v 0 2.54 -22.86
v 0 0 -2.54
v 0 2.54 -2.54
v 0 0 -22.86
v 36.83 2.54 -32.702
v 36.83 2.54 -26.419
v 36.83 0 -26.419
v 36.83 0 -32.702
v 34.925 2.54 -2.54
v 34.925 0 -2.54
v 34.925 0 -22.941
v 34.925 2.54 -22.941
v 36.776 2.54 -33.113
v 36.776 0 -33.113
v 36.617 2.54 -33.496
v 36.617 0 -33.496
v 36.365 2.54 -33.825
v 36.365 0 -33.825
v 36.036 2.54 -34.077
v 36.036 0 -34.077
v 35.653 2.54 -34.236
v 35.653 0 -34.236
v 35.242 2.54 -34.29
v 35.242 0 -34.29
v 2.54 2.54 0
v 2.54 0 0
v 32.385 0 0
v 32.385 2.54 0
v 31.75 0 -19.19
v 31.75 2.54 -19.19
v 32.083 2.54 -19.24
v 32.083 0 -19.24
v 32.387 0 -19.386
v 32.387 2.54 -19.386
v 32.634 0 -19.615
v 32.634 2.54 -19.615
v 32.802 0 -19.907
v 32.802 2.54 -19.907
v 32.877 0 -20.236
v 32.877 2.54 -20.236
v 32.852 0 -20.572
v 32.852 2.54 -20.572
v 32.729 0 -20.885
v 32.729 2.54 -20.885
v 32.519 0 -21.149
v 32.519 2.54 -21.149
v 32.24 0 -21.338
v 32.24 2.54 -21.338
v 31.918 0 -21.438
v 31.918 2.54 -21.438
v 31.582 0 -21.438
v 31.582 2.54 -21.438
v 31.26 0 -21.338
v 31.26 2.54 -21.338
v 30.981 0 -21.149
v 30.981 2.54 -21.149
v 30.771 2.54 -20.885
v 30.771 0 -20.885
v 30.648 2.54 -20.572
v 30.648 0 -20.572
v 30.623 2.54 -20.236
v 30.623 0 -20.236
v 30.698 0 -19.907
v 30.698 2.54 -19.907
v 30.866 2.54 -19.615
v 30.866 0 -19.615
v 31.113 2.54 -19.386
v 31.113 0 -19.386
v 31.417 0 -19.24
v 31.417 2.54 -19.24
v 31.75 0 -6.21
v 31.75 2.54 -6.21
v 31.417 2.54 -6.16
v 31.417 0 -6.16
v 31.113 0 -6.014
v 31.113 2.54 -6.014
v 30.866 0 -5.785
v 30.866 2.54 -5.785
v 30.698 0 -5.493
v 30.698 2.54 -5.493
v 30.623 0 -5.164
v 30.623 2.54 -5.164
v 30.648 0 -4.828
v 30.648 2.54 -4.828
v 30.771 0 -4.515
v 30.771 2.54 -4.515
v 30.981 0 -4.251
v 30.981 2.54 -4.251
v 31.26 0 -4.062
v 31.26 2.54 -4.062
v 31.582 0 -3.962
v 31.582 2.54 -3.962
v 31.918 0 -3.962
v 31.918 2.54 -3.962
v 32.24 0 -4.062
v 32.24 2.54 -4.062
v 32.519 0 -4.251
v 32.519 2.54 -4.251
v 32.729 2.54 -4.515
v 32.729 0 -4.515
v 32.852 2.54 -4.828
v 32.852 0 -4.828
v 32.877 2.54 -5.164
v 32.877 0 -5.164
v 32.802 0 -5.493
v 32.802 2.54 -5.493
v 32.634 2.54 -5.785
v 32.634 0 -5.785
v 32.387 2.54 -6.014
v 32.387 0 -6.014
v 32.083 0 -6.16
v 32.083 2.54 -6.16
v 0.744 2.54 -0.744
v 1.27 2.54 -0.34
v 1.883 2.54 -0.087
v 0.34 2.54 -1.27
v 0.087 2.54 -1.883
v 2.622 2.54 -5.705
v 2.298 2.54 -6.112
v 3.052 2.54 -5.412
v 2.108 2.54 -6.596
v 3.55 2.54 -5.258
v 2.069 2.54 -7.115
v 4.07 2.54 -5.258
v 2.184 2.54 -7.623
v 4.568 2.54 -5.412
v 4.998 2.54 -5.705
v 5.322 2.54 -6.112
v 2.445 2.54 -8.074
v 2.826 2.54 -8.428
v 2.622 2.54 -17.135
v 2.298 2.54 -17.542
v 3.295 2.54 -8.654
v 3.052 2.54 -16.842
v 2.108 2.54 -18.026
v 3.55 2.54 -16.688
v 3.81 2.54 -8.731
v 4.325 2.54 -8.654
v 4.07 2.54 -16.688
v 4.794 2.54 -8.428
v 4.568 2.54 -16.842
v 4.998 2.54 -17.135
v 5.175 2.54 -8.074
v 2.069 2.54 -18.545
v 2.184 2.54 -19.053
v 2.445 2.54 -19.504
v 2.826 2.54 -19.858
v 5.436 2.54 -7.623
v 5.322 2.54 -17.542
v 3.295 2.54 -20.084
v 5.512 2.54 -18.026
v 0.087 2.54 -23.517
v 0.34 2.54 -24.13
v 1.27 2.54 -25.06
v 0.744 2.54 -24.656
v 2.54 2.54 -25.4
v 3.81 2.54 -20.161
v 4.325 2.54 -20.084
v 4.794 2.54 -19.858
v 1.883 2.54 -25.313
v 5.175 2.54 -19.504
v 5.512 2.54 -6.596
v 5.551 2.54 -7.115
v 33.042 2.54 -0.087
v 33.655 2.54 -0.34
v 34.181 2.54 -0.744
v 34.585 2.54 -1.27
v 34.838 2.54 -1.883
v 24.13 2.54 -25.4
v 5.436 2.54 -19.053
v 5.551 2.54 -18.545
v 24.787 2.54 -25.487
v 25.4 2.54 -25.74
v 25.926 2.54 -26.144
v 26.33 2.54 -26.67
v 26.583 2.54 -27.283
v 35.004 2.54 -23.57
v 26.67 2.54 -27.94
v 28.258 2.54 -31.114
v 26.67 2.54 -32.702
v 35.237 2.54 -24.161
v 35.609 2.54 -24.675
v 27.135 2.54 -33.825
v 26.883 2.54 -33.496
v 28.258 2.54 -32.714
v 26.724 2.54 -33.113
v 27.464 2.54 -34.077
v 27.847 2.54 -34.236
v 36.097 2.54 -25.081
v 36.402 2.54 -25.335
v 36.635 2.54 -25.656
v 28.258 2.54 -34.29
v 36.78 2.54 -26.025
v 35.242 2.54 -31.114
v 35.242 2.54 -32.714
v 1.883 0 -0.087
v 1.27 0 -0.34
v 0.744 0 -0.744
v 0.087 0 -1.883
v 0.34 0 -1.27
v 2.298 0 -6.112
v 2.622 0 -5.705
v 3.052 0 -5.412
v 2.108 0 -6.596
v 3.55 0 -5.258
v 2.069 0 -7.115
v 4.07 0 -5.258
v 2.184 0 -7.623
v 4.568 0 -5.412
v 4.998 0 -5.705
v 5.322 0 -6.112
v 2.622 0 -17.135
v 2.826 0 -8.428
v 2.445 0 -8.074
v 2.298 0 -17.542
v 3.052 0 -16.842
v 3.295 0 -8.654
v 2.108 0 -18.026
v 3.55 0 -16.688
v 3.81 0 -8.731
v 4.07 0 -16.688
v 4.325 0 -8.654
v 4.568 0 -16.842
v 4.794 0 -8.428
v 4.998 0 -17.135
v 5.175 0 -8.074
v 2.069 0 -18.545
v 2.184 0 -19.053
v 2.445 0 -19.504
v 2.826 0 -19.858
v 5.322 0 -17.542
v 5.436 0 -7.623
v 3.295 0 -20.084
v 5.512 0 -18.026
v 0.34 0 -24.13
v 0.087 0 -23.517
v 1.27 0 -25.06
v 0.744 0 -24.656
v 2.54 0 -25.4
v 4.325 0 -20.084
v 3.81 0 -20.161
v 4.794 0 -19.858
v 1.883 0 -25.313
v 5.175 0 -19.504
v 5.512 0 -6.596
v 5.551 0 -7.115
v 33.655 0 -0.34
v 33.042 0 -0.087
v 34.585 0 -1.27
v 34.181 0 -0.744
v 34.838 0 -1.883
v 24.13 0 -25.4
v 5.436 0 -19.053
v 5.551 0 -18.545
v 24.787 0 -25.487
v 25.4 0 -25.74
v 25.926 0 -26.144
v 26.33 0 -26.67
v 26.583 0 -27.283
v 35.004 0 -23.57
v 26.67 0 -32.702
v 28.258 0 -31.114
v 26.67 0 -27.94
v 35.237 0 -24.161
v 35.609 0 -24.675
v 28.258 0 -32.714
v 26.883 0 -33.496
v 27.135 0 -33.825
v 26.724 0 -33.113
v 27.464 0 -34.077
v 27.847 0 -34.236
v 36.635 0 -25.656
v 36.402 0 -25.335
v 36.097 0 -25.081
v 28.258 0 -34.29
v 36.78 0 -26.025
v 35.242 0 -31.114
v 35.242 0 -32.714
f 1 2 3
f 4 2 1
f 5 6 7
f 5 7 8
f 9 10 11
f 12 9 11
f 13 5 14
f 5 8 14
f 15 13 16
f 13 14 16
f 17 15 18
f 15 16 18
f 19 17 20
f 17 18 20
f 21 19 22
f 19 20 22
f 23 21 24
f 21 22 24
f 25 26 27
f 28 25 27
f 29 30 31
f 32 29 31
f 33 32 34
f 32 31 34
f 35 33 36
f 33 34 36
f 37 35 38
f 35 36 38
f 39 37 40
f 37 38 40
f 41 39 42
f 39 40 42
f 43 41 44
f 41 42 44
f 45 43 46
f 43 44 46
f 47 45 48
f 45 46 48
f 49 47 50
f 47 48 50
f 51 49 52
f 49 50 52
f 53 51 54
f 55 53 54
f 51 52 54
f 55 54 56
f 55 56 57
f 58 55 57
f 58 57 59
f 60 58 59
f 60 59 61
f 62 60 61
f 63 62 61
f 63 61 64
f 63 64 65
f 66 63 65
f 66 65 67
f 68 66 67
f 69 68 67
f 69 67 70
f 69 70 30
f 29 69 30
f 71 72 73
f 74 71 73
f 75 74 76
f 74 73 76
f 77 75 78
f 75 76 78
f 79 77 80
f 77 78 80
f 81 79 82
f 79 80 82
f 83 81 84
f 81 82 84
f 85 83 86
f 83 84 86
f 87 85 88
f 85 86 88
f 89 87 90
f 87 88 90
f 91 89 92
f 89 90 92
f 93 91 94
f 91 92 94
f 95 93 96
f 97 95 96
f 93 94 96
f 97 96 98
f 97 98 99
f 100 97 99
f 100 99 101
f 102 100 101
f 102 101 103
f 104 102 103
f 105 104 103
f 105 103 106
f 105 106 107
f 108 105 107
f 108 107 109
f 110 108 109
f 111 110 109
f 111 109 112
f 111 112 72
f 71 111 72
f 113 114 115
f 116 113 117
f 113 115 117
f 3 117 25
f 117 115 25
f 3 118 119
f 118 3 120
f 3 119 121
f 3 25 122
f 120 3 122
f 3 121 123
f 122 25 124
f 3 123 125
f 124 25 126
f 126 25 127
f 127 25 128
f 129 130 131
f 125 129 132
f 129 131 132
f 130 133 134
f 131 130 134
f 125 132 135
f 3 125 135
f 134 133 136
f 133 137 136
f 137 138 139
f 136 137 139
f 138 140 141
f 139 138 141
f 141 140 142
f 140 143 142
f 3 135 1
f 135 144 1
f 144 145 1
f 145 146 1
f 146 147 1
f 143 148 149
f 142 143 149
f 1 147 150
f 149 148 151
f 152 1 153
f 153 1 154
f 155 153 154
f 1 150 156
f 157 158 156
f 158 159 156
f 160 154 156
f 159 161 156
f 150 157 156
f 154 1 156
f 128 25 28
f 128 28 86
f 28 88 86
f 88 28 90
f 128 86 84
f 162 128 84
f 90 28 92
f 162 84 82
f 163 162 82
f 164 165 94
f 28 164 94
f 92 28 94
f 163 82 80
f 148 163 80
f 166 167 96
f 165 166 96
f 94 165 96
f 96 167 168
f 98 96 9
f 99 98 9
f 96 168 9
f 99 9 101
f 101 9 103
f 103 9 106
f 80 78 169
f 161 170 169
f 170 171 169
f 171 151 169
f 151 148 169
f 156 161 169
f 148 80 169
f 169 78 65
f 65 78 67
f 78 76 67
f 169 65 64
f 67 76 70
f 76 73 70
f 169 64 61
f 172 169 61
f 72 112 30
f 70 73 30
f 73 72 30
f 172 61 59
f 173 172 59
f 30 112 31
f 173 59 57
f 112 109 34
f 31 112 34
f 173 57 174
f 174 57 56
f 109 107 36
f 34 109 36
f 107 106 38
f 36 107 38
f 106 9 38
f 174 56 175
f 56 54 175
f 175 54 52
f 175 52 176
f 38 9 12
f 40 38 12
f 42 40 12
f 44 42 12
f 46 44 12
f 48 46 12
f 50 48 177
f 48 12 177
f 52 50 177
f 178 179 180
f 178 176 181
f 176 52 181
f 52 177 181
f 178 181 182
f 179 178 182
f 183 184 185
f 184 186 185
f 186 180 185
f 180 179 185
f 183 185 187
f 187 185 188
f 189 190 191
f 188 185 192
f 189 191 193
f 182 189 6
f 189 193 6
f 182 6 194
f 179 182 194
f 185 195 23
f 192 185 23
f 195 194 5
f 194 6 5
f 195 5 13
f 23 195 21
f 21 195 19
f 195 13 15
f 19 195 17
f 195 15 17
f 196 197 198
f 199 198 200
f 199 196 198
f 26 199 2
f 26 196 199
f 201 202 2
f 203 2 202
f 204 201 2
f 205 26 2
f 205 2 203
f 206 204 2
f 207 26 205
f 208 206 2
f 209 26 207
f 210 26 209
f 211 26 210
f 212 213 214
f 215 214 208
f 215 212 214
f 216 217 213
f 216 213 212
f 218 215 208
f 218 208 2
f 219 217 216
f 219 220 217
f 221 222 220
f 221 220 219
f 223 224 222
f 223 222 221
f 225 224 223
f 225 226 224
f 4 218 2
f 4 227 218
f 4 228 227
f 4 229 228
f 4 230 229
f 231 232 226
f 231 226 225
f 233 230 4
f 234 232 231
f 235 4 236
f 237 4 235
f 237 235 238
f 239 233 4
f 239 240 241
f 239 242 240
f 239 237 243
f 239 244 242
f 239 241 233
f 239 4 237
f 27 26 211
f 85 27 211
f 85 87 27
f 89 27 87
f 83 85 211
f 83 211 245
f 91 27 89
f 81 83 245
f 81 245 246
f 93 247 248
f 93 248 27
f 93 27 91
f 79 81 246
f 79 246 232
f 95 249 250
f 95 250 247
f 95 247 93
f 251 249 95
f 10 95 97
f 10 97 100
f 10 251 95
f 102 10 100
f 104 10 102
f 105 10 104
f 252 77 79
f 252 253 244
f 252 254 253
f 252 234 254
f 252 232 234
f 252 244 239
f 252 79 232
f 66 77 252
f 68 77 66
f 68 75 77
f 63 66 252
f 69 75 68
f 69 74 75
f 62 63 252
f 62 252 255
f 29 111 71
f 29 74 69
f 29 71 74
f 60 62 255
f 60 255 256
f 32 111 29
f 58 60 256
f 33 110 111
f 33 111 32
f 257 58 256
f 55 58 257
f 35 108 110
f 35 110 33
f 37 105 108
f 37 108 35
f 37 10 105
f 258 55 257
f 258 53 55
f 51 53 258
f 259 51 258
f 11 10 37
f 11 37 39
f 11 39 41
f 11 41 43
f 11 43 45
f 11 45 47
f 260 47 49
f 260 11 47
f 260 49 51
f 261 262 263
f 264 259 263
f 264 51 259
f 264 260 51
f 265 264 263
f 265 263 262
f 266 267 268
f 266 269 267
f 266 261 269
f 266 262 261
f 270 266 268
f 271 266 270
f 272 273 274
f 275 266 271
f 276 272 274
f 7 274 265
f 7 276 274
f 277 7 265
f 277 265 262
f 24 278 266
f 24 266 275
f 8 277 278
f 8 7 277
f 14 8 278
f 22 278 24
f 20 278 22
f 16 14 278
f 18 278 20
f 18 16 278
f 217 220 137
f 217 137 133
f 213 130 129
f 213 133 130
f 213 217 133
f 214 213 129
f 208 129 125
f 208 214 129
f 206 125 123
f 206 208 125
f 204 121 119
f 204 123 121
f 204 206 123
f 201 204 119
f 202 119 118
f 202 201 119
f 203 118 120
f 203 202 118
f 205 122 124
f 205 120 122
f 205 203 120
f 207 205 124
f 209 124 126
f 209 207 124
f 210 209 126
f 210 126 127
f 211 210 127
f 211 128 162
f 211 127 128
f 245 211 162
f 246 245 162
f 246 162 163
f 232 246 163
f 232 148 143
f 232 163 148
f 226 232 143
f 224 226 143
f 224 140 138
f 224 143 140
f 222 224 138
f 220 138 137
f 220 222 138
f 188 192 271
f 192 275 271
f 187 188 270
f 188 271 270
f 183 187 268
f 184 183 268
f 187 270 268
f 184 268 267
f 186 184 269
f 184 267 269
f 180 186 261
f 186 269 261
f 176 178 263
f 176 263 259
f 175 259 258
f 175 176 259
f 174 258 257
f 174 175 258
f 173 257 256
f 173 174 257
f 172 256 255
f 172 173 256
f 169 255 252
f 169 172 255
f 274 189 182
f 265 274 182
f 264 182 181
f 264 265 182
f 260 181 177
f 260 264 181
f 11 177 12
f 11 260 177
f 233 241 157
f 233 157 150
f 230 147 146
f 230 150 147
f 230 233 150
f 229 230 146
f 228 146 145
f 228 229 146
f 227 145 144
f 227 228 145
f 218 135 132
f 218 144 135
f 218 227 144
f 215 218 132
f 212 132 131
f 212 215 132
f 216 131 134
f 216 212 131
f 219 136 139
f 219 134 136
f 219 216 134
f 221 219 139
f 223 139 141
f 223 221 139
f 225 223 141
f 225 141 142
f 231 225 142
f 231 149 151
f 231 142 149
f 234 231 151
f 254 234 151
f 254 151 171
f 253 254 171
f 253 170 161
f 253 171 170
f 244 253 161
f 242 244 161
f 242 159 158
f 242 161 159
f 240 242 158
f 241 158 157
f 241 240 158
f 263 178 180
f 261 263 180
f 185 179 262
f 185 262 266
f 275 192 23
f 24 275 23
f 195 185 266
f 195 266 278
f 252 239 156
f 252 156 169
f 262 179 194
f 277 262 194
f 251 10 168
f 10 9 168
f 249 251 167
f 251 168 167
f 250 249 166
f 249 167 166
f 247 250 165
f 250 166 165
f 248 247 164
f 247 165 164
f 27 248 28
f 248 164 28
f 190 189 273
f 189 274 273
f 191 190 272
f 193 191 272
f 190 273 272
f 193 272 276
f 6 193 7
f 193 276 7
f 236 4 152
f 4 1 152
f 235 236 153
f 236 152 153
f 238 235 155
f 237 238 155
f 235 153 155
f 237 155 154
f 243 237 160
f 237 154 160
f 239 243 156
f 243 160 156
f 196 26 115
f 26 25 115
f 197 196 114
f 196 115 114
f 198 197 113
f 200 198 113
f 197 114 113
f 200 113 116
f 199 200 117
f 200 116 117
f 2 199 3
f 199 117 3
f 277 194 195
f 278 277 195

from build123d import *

# Parameters (mm, degrees)
SKETCH1_W               = 34.925
SKETCH1_H               = 25.4
BOSS_EXTRUDE1_DEPTH     = 2.54
CUT_EXTRUDE3_DEPTH      = 44.259302179
CUT_EXTRUDE3_DEPTH_BACK = 44.259302179
SKETCH2_R               = 1.74625
SKETCH5_R               = 1.1303
CUT_EXTRUDE4_DEPTH      = 44.259302179
SKETCH6_W               = 10.16
SKETCH6_H               = 8.89
BOSS_EXTRUDE2_DEPTH     = 2.54
SKETCH7_W               = 6.985
SKETCH7_H               = 1.6002
CUT_EXTRUDE5_DEPTH      = 51.385559439
FILLET1_R               = 2.54
FILLET2_R               = 1.5875
FILLET3_R               = 2.54


with BuildPart() as part:
    # Sketch1 → Boss-Extrude1 (new body)
    with BuildSketch(Plane(origin=(0, 0, 0), x_dir=(1, 0, 0), z_dir=(0, 1, 0))):
        with Locations((17.4625, 12.7)):
            Rectangle(SKETCH1_W, SKETCH1_H)
    extrude(amount=BOSS_EXTRUDE1_DEPTH)

    # Sketch2 → Cut-Extrude3 (cut, two sides: drawn at the far end of the back side and taken through both)
    with BuildSketch(Plane(origin=(0, 2.54, 0), x_dir=(1, 0, 0), z_dir=(0, 1, 0)).offset(-CUT_EXTRUDE3_DEPTH_BACK)):
        with Locations(Location((3.81, 18.415, 0), (0, 0, 90))):
            Circle(SKETCH2_R)
        with Locations(Location((3.81, 6.985, 0), (0, 0, 90))):
            Circle(SKETCH2_R)
    extrude(amount=CUT_EXTRUDE3_DEPTH + CUT_EXTRUDE3_DEPTH_BACK, mode=Mode.SUBTRACT)

    # Sketch5 → Cut-Extrude4 (cut, through all)
    with BuildSketch(Plane(origin=(0, 2.54, 0), x_dir=(1, 0, 0), z_dir=(0, 1, 0))):
        with Locations(Location((31.75, 20.32, 0), (0, 0, 270))):
            Circle(SKETCH5_R)
        with Locations(Location((31.75, 5.08, 0), (0, 0, 90))):
            Circle(SKETCH5_R)
    extrude(amount=-CUT_EXTRUDE4_DEPTH, mode=Mode.SUBTRACT)

    # Sketch6 → Boss-Extrude2 (add)
    with BuildSketch(Plane(origin=(0, 2.54, 0), x_dir=(1, 0, 0), z_dir=(0, 1, 0))):
        with Locations((31.75, 29.845)):
            Rectangle(SKETCH6_W, SKETCH6_H)
    extrude(amount=-BOSS_EXTRUDE2_DEPTH)

    # Sketch7 → Cut-Extrude5 (cut, through all)
    with BuildSketch(Plane(origin=(0, 2.54, 0), x_dir=(1, 0, 0), z_dir=(0, 1, 0))):
        with Locations((31.75, 31.913620935)):
            Rectangle(SKETCH7_W, SKETCH7_H)
    extrude(amount=-CUT_EXTRUDE5_DEPTH, mode=Mode.SUBTRACT)

    # Fillet1
    # the kernel refuses this fillet: 2.54 mm, written as the material it adds along each edge
    with BuildSketch(Plane(origin=(26.67, 2.54, -25.4), x_dir=(-1, 0, 0), z_dir=(0, -1, 0))) as fillet1_piece_1:
        with BuildLine():
            CenterArc((FILLET1_R, FILLET1_R), FILLET1_R, 180, 90)
            Line((0, FILLET1_R), (-FILLET1_R * 0.02, FILLET1_R))
            Line((-FILLET1_R * 0.02, FILLET1_R), (-FILLET1_R * 0.02, -FILLET1_R * 0.02))
            Line((-FILLET1_R * 0.02, -FILLET1_R * 0.02), (FILLET1_R, -FILLET1_R * 0.02))
            Line((FILLET1_R, -FILLET1_R * 0.02), (FILLET1_R, 0))
        make_face()
    extrude(amount=2.54)
    with BuildSketch(Plane(origin=(34.925, 0, -25.4), x_dir=(0, 0, 1), z_dir=(0, 1, 0))) as fillet1_piece_2:
        with BuildLine():
            CenterArc((2.459344425, 2.54), FILLET1_R, 194.477512186, 75.522487814)
            Line((0, 1.905), (-0.049186888, 1.8923))
            ThreePointArc((-0.049186888, 1.8923), (-0.0508, 0.9525), (-0.0508, 0))
            Line((-0.0508, 0), (0, -0.0508))
            Line((0, -0.0508), (2.459344425, -0.0508))
            Line((2.459344425, -0.0508), (2.459344425, 0))
        make_face()
    extrude(amount=2.54)

    # Fillet2
    fillet2_edges = [part.edges().sort_by_distance(p)[0] for p in [
        (26.67, 1.27, -34.29),
        (36.83, 1.27, -34.29),
        (36.83, 1.27, -25.4),
    ]]
    fillet(fillet2_edges, radius=FILLET2_R)

    # Fillet3
    fillet3_edges = [part.edges().sort_by_distance(p)[0] for p in [
        (0, 1.27, -25.4),
        (34.925, 1.27, 0),
        (0, 1.27, 0),
    ]]
    fillet(fillet3_edges, radius=FILLET3_R)


solid = part.part
